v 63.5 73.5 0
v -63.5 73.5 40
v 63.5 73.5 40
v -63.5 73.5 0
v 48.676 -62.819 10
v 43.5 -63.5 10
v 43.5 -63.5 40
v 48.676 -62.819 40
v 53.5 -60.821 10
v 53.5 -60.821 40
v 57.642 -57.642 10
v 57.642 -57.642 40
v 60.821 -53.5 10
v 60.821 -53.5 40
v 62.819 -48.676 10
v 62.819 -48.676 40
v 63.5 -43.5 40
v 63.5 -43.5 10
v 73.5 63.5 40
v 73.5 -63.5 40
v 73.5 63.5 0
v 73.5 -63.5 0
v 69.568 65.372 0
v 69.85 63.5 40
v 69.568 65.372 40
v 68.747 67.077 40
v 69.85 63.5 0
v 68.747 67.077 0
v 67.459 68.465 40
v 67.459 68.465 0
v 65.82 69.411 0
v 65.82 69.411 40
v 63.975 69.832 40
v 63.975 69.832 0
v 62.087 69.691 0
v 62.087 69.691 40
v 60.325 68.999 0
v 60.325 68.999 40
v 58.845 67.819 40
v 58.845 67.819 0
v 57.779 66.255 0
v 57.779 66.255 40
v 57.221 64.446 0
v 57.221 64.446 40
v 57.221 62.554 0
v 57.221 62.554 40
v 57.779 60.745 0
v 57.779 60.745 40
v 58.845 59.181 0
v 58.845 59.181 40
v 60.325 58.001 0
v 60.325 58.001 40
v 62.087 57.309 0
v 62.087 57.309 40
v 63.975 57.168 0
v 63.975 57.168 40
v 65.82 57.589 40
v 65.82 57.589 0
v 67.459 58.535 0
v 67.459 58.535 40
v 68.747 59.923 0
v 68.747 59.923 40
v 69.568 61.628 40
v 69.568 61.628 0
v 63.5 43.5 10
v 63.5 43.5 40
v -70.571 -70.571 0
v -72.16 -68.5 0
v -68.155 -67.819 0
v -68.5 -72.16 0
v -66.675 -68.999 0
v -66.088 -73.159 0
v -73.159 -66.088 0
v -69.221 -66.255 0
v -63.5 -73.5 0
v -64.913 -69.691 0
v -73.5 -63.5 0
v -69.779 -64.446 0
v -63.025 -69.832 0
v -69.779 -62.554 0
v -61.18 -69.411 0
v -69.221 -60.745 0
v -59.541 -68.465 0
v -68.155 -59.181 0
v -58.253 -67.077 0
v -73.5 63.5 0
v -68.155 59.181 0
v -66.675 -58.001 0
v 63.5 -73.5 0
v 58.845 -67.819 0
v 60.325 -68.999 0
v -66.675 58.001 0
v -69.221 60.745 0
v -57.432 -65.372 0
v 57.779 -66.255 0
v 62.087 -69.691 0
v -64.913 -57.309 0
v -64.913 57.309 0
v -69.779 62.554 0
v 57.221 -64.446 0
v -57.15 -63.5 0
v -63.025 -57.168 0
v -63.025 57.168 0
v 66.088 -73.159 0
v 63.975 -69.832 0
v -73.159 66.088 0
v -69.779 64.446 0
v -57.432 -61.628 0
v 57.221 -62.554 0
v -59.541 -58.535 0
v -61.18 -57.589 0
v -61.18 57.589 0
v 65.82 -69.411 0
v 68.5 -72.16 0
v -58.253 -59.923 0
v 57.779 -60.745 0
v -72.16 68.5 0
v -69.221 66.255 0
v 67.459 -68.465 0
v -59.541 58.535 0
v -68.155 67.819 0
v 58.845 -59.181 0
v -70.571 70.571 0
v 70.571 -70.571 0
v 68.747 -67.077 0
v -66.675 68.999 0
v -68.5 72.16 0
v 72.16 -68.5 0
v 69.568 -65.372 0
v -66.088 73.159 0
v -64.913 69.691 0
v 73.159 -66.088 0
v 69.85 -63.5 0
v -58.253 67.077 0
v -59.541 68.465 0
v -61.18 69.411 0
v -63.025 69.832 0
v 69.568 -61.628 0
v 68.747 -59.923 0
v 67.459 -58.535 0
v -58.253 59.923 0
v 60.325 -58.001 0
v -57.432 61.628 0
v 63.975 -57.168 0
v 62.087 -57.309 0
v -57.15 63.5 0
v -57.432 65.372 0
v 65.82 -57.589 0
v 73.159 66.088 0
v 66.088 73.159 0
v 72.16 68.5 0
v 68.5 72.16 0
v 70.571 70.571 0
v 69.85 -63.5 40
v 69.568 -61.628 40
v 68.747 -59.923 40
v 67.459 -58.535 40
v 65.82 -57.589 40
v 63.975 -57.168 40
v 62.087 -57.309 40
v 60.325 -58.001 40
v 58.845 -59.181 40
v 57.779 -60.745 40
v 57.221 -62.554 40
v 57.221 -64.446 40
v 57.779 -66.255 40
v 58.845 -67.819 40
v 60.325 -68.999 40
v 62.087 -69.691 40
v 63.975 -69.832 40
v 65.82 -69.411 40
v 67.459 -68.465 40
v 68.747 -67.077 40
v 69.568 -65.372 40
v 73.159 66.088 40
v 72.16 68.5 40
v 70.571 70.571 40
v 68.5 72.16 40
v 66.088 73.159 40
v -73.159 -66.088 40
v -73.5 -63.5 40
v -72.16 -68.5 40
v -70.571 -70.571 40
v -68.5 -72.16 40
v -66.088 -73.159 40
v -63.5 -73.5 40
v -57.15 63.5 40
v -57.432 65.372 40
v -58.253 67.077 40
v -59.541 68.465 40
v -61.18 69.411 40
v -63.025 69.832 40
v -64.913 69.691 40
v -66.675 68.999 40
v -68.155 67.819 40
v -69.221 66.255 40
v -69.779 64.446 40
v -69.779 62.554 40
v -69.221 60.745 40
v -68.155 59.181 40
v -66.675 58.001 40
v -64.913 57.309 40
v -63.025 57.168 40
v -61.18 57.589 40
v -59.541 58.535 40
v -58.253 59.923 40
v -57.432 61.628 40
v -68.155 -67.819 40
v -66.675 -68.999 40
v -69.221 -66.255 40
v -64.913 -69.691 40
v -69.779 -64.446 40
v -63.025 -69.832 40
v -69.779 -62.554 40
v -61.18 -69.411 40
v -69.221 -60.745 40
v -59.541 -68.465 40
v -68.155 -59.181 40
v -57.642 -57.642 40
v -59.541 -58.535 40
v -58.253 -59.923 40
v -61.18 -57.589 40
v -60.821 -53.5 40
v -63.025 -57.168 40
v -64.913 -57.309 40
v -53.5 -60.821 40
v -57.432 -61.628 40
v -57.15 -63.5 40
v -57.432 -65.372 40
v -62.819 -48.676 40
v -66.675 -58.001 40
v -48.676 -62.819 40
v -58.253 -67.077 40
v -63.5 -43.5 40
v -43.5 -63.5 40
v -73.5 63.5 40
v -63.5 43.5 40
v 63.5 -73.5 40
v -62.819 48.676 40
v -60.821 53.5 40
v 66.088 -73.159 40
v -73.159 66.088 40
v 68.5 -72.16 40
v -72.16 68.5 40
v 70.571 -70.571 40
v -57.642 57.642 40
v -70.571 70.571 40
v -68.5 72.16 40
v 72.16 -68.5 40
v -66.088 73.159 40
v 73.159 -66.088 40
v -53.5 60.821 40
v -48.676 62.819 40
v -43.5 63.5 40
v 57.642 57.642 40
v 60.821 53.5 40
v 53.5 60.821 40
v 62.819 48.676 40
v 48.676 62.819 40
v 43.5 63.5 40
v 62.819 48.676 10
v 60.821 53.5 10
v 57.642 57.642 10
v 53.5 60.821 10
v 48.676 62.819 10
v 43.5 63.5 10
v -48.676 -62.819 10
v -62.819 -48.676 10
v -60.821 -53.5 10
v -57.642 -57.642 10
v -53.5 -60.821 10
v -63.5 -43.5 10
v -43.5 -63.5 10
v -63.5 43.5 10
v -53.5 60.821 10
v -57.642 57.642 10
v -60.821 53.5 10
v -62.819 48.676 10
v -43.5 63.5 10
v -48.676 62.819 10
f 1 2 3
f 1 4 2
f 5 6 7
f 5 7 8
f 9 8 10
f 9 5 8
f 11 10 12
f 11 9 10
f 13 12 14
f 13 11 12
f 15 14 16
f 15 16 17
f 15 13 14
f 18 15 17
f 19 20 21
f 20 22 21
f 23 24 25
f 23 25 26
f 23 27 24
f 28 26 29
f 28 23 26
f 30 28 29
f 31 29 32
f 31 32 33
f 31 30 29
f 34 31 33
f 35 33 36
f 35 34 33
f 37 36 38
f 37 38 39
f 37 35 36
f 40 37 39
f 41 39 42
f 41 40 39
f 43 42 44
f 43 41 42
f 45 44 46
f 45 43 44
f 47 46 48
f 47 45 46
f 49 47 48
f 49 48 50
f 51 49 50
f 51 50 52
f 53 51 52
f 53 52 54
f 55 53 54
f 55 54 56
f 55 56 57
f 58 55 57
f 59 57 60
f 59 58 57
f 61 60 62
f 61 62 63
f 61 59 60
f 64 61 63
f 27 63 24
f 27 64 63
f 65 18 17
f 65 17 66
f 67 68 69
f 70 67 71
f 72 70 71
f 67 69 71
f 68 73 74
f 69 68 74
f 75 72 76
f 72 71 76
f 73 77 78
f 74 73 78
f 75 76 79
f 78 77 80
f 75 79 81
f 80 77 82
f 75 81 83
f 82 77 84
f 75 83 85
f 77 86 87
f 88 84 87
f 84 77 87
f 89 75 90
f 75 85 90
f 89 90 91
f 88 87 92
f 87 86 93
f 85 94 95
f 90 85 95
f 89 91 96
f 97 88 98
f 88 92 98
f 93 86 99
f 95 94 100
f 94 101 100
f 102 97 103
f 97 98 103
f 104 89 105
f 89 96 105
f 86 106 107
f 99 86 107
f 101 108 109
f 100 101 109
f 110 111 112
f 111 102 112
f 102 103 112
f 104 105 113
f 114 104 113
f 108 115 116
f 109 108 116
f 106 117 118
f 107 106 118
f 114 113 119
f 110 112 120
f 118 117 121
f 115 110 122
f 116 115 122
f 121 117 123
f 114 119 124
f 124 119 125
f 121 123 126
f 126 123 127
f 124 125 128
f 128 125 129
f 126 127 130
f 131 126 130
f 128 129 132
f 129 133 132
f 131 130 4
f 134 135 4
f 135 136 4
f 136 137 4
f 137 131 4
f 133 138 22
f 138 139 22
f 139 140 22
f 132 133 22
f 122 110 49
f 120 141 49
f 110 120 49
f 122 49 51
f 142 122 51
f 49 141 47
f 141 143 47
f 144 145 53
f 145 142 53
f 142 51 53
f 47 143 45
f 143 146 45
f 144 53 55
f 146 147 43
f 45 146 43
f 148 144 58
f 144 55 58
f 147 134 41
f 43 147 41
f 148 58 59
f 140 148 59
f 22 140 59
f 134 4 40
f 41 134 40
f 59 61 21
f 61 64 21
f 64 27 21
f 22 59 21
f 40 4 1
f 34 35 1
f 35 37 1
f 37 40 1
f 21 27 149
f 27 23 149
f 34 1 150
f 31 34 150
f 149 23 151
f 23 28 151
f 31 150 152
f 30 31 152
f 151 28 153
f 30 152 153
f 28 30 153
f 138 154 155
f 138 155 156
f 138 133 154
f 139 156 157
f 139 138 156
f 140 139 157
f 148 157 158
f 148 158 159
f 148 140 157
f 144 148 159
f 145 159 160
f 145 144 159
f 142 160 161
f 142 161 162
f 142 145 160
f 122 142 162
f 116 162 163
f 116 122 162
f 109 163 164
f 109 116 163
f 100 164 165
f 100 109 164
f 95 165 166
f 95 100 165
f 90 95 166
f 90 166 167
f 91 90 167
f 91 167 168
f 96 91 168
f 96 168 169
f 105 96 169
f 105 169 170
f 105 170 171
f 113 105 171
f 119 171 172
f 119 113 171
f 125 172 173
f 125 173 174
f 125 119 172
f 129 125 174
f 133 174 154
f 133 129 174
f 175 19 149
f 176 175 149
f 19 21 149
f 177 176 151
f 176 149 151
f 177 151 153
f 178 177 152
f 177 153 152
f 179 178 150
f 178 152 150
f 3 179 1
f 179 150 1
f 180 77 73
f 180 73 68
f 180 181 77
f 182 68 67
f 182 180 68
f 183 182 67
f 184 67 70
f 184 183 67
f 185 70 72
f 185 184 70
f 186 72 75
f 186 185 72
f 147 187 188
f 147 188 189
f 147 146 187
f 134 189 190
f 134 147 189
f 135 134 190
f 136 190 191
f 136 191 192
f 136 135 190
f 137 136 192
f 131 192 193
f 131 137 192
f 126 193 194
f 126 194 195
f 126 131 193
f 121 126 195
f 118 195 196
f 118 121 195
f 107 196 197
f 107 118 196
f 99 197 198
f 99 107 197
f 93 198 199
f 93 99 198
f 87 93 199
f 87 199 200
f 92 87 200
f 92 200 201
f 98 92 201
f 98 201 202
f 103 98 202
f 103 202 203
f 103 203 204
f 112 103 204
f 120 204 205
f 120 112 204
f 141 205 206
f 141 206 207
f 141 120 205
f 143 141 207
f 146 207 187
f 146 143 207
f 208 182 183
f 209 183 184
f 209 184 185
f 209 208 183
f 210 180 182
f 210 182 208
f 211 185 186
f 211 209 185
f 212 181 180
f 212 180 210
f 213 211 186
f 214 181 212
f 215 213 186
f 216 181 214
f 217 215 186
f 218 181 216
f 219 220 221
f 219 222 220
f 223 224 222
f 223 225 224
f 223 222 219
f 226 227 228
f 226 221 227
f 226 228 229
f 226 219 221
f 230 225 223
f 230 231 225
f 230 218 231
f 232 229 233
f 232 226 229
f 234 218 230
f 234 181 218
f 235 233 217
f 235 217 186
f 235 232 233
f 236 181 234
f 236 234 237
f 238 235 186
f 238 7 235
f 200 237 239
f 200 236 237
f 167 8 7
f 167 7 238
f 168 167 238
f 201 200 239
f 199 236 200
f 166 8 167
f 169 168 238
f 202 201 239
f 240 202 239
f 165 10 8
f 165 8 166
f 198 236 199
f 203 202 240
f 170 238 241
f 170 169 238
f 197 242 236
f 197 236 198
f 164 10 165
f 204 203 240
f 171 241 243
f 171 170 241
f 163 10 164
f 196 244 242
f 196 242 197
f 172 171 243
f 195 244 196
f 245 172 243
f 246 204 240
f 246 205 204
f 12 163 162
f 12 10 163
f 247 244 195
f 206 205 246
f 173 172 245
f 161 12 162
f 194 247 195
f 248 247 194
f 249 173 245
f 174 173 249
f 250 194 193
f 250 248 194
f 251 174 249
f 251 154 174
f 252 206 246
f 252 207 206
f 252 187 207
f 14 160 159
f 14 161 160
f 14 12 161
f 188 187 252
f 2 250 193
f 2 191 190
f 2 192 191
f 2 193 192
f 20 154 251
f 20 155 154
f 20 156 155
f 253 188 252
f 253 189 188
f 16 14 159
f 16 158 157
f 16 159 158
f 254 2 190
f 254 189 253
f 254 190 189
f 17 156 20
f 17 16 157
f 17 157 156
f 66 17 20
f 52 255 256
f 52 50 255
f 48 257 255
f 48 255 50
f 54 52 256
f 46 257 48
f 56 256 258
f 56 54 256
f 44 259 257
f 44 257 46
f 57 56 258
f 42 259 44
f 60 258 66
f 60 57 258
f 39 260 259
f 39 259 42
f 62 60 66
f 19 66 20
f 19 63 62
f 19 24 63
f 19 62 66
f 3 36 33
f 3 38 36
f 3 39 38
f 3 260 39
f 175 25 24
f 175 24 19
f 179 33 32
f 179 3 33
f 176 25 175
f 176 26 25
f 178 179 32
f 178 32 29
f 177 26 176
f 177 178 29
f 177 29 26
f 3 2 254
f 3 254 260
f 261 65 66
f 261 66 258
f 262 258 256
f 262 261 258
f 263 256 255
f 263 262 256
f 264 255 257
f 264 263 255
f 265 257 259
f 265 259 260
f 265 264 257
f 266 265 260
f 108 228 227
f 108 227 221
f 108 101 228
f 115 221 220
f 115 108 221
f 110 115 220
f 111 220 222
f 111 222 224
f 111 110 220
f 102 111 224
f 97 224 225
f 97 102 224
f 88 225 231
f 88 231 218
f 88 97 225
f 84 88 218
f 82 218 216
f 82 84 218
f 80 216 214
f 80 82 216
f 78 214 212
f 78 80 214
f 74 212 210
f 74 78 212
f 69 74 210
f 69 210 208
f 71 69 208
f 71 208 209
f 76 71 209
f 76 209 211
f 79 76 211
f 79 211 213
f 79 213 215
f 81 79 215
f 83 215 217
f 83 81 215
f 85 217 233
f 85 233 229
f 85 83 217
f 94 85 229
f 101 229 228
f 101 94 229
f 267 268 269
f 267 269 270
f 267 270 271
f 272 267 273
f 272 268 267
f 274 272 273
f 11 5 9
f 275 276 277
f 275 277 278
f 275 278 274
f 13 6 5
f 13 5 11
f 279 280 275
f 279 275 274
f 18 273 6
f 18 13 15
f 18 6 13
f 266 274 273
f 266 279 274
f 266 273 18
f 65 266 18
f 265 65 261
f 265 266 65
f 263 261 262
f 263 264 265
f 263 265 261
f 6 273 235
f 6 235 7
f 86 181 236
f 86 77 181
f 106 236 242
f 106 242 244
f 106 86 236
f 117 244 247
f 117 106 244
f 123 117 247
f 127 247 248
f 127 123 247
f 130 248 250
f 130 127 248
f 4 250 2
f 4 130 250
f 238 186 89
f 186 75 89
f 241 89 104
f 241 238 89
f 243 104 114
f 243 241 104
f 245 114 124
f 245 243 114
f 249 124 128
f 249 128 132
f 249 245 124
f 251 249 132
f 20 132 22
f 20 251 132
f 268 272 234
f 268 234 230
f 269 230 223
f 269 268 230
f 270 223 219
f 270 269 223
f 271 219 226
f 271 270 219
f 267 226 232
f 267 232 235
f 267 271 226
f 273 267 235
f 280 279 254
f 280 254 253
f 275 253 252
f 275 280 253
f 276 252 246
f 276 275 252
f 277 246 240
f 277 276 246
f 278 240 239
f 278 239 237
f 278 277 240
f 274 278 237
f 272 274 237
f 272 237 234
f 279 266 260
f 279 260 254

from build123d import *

# Parameters (mm, degrees)
SKETCH1_W           = 147
SKETCH1_H           = 147
SKETCH1_R           = 6.35
BOSS_EXTRUDE1_DEPTH = 10
SKETCH2_W           = 147
SKETCH2_H           = 147
SKETCH2_R           = 6.35
BOSS_EXTRUDE2_DEPTH = 30
FILLET1_R           = 10


with BuildPart() as part:
    # Sketch1 → Boss-Extrude1 (new body)
    with BuildSketch(Plane.XY):
        Rectangle(SKETCH1_W, SKETCH1_H)
        with Locations((-63.5, 63.5)):
            Circle(SKETCH1_R, mode=Mode.SUBTRACT)
        with Locations((63.5, 63.5)):
            Circle(SKETCH1_R, mode=Mode.SUBTRACT)
        with Locations((63.5, -63.5)):
            Circle(SKETCH1_R, mode=Mode.SUBTRACT)
        with Locations((-63.5, -63.5)):
            Circle(SKETCH1_R, mode=Mode.SUBTRACT)
    extrude(amount=BOSS_EXTRUDE1_DEPTH)

    # Sketch2 → Boss-Extrude2 (add)
    with BuildSketch(Plane.XY.offset(10)):
        Rectangle(SKETCH2_W, SKETCH2_H)
        with Locations((-63.5, -63.5)):
            Circle(SKETCH2_R, mode=Mode.SUBTRACT)
        with Locations((63.5, -63.5)):
            Circle(SKETCH2_R, mode=Mode.SUBTRACT)
        with Locations((63.5, 63.5)):
            Circle(SKETCH2_R, mode=Mode.SUBTRACT)
        with Locations((-63.5, 63.5)):
            Circle(SKETCH2_R, mode=Mode.SUBTRACT)
        with BuildLine():
            Line((-43.5, -63.5), (43.5, -63.5))
            ThreePointArc((43.5, -63.5), (57.642135624, -57.642135624), (63.5, -43.5))
            Line((63.5, -43.5), (63.5, 43.5))
            ThreePointArc((63.5, 43.5), (57.642135624, 57.642135624), (43.5, 63.5))
            Line((43.5, 63.5), (-43.5, 63.5))
            ThreePointArc((-43.5, 63.5), (-57.642135624, 57.642135624), (-63.5, 43.5))
            Line((-63.5, 43.5), (-63.5, -43.5))
            ThreePointArc((-63.5, -43.5), (-57.642135624, -57.642135624), (-43.5, -63.5))
        make_face(mode=Mode.SUBTRACT)
    extrude(amount=BOSS_EXTRUDE2_DEPTH)

    # Fillet1
    fillet1_edges = [part.edges().sort_by_distance(p)[0] for p in [
        (-73.5, -73.5, 20),
        (-73.5, 73.5, 20),
        (73.5, 73.5, 20),
        (73.5, -73.5, 20),
    ]]
    fillet(fillet1_edges, radius=FILLET1_R)


solid = part.part
